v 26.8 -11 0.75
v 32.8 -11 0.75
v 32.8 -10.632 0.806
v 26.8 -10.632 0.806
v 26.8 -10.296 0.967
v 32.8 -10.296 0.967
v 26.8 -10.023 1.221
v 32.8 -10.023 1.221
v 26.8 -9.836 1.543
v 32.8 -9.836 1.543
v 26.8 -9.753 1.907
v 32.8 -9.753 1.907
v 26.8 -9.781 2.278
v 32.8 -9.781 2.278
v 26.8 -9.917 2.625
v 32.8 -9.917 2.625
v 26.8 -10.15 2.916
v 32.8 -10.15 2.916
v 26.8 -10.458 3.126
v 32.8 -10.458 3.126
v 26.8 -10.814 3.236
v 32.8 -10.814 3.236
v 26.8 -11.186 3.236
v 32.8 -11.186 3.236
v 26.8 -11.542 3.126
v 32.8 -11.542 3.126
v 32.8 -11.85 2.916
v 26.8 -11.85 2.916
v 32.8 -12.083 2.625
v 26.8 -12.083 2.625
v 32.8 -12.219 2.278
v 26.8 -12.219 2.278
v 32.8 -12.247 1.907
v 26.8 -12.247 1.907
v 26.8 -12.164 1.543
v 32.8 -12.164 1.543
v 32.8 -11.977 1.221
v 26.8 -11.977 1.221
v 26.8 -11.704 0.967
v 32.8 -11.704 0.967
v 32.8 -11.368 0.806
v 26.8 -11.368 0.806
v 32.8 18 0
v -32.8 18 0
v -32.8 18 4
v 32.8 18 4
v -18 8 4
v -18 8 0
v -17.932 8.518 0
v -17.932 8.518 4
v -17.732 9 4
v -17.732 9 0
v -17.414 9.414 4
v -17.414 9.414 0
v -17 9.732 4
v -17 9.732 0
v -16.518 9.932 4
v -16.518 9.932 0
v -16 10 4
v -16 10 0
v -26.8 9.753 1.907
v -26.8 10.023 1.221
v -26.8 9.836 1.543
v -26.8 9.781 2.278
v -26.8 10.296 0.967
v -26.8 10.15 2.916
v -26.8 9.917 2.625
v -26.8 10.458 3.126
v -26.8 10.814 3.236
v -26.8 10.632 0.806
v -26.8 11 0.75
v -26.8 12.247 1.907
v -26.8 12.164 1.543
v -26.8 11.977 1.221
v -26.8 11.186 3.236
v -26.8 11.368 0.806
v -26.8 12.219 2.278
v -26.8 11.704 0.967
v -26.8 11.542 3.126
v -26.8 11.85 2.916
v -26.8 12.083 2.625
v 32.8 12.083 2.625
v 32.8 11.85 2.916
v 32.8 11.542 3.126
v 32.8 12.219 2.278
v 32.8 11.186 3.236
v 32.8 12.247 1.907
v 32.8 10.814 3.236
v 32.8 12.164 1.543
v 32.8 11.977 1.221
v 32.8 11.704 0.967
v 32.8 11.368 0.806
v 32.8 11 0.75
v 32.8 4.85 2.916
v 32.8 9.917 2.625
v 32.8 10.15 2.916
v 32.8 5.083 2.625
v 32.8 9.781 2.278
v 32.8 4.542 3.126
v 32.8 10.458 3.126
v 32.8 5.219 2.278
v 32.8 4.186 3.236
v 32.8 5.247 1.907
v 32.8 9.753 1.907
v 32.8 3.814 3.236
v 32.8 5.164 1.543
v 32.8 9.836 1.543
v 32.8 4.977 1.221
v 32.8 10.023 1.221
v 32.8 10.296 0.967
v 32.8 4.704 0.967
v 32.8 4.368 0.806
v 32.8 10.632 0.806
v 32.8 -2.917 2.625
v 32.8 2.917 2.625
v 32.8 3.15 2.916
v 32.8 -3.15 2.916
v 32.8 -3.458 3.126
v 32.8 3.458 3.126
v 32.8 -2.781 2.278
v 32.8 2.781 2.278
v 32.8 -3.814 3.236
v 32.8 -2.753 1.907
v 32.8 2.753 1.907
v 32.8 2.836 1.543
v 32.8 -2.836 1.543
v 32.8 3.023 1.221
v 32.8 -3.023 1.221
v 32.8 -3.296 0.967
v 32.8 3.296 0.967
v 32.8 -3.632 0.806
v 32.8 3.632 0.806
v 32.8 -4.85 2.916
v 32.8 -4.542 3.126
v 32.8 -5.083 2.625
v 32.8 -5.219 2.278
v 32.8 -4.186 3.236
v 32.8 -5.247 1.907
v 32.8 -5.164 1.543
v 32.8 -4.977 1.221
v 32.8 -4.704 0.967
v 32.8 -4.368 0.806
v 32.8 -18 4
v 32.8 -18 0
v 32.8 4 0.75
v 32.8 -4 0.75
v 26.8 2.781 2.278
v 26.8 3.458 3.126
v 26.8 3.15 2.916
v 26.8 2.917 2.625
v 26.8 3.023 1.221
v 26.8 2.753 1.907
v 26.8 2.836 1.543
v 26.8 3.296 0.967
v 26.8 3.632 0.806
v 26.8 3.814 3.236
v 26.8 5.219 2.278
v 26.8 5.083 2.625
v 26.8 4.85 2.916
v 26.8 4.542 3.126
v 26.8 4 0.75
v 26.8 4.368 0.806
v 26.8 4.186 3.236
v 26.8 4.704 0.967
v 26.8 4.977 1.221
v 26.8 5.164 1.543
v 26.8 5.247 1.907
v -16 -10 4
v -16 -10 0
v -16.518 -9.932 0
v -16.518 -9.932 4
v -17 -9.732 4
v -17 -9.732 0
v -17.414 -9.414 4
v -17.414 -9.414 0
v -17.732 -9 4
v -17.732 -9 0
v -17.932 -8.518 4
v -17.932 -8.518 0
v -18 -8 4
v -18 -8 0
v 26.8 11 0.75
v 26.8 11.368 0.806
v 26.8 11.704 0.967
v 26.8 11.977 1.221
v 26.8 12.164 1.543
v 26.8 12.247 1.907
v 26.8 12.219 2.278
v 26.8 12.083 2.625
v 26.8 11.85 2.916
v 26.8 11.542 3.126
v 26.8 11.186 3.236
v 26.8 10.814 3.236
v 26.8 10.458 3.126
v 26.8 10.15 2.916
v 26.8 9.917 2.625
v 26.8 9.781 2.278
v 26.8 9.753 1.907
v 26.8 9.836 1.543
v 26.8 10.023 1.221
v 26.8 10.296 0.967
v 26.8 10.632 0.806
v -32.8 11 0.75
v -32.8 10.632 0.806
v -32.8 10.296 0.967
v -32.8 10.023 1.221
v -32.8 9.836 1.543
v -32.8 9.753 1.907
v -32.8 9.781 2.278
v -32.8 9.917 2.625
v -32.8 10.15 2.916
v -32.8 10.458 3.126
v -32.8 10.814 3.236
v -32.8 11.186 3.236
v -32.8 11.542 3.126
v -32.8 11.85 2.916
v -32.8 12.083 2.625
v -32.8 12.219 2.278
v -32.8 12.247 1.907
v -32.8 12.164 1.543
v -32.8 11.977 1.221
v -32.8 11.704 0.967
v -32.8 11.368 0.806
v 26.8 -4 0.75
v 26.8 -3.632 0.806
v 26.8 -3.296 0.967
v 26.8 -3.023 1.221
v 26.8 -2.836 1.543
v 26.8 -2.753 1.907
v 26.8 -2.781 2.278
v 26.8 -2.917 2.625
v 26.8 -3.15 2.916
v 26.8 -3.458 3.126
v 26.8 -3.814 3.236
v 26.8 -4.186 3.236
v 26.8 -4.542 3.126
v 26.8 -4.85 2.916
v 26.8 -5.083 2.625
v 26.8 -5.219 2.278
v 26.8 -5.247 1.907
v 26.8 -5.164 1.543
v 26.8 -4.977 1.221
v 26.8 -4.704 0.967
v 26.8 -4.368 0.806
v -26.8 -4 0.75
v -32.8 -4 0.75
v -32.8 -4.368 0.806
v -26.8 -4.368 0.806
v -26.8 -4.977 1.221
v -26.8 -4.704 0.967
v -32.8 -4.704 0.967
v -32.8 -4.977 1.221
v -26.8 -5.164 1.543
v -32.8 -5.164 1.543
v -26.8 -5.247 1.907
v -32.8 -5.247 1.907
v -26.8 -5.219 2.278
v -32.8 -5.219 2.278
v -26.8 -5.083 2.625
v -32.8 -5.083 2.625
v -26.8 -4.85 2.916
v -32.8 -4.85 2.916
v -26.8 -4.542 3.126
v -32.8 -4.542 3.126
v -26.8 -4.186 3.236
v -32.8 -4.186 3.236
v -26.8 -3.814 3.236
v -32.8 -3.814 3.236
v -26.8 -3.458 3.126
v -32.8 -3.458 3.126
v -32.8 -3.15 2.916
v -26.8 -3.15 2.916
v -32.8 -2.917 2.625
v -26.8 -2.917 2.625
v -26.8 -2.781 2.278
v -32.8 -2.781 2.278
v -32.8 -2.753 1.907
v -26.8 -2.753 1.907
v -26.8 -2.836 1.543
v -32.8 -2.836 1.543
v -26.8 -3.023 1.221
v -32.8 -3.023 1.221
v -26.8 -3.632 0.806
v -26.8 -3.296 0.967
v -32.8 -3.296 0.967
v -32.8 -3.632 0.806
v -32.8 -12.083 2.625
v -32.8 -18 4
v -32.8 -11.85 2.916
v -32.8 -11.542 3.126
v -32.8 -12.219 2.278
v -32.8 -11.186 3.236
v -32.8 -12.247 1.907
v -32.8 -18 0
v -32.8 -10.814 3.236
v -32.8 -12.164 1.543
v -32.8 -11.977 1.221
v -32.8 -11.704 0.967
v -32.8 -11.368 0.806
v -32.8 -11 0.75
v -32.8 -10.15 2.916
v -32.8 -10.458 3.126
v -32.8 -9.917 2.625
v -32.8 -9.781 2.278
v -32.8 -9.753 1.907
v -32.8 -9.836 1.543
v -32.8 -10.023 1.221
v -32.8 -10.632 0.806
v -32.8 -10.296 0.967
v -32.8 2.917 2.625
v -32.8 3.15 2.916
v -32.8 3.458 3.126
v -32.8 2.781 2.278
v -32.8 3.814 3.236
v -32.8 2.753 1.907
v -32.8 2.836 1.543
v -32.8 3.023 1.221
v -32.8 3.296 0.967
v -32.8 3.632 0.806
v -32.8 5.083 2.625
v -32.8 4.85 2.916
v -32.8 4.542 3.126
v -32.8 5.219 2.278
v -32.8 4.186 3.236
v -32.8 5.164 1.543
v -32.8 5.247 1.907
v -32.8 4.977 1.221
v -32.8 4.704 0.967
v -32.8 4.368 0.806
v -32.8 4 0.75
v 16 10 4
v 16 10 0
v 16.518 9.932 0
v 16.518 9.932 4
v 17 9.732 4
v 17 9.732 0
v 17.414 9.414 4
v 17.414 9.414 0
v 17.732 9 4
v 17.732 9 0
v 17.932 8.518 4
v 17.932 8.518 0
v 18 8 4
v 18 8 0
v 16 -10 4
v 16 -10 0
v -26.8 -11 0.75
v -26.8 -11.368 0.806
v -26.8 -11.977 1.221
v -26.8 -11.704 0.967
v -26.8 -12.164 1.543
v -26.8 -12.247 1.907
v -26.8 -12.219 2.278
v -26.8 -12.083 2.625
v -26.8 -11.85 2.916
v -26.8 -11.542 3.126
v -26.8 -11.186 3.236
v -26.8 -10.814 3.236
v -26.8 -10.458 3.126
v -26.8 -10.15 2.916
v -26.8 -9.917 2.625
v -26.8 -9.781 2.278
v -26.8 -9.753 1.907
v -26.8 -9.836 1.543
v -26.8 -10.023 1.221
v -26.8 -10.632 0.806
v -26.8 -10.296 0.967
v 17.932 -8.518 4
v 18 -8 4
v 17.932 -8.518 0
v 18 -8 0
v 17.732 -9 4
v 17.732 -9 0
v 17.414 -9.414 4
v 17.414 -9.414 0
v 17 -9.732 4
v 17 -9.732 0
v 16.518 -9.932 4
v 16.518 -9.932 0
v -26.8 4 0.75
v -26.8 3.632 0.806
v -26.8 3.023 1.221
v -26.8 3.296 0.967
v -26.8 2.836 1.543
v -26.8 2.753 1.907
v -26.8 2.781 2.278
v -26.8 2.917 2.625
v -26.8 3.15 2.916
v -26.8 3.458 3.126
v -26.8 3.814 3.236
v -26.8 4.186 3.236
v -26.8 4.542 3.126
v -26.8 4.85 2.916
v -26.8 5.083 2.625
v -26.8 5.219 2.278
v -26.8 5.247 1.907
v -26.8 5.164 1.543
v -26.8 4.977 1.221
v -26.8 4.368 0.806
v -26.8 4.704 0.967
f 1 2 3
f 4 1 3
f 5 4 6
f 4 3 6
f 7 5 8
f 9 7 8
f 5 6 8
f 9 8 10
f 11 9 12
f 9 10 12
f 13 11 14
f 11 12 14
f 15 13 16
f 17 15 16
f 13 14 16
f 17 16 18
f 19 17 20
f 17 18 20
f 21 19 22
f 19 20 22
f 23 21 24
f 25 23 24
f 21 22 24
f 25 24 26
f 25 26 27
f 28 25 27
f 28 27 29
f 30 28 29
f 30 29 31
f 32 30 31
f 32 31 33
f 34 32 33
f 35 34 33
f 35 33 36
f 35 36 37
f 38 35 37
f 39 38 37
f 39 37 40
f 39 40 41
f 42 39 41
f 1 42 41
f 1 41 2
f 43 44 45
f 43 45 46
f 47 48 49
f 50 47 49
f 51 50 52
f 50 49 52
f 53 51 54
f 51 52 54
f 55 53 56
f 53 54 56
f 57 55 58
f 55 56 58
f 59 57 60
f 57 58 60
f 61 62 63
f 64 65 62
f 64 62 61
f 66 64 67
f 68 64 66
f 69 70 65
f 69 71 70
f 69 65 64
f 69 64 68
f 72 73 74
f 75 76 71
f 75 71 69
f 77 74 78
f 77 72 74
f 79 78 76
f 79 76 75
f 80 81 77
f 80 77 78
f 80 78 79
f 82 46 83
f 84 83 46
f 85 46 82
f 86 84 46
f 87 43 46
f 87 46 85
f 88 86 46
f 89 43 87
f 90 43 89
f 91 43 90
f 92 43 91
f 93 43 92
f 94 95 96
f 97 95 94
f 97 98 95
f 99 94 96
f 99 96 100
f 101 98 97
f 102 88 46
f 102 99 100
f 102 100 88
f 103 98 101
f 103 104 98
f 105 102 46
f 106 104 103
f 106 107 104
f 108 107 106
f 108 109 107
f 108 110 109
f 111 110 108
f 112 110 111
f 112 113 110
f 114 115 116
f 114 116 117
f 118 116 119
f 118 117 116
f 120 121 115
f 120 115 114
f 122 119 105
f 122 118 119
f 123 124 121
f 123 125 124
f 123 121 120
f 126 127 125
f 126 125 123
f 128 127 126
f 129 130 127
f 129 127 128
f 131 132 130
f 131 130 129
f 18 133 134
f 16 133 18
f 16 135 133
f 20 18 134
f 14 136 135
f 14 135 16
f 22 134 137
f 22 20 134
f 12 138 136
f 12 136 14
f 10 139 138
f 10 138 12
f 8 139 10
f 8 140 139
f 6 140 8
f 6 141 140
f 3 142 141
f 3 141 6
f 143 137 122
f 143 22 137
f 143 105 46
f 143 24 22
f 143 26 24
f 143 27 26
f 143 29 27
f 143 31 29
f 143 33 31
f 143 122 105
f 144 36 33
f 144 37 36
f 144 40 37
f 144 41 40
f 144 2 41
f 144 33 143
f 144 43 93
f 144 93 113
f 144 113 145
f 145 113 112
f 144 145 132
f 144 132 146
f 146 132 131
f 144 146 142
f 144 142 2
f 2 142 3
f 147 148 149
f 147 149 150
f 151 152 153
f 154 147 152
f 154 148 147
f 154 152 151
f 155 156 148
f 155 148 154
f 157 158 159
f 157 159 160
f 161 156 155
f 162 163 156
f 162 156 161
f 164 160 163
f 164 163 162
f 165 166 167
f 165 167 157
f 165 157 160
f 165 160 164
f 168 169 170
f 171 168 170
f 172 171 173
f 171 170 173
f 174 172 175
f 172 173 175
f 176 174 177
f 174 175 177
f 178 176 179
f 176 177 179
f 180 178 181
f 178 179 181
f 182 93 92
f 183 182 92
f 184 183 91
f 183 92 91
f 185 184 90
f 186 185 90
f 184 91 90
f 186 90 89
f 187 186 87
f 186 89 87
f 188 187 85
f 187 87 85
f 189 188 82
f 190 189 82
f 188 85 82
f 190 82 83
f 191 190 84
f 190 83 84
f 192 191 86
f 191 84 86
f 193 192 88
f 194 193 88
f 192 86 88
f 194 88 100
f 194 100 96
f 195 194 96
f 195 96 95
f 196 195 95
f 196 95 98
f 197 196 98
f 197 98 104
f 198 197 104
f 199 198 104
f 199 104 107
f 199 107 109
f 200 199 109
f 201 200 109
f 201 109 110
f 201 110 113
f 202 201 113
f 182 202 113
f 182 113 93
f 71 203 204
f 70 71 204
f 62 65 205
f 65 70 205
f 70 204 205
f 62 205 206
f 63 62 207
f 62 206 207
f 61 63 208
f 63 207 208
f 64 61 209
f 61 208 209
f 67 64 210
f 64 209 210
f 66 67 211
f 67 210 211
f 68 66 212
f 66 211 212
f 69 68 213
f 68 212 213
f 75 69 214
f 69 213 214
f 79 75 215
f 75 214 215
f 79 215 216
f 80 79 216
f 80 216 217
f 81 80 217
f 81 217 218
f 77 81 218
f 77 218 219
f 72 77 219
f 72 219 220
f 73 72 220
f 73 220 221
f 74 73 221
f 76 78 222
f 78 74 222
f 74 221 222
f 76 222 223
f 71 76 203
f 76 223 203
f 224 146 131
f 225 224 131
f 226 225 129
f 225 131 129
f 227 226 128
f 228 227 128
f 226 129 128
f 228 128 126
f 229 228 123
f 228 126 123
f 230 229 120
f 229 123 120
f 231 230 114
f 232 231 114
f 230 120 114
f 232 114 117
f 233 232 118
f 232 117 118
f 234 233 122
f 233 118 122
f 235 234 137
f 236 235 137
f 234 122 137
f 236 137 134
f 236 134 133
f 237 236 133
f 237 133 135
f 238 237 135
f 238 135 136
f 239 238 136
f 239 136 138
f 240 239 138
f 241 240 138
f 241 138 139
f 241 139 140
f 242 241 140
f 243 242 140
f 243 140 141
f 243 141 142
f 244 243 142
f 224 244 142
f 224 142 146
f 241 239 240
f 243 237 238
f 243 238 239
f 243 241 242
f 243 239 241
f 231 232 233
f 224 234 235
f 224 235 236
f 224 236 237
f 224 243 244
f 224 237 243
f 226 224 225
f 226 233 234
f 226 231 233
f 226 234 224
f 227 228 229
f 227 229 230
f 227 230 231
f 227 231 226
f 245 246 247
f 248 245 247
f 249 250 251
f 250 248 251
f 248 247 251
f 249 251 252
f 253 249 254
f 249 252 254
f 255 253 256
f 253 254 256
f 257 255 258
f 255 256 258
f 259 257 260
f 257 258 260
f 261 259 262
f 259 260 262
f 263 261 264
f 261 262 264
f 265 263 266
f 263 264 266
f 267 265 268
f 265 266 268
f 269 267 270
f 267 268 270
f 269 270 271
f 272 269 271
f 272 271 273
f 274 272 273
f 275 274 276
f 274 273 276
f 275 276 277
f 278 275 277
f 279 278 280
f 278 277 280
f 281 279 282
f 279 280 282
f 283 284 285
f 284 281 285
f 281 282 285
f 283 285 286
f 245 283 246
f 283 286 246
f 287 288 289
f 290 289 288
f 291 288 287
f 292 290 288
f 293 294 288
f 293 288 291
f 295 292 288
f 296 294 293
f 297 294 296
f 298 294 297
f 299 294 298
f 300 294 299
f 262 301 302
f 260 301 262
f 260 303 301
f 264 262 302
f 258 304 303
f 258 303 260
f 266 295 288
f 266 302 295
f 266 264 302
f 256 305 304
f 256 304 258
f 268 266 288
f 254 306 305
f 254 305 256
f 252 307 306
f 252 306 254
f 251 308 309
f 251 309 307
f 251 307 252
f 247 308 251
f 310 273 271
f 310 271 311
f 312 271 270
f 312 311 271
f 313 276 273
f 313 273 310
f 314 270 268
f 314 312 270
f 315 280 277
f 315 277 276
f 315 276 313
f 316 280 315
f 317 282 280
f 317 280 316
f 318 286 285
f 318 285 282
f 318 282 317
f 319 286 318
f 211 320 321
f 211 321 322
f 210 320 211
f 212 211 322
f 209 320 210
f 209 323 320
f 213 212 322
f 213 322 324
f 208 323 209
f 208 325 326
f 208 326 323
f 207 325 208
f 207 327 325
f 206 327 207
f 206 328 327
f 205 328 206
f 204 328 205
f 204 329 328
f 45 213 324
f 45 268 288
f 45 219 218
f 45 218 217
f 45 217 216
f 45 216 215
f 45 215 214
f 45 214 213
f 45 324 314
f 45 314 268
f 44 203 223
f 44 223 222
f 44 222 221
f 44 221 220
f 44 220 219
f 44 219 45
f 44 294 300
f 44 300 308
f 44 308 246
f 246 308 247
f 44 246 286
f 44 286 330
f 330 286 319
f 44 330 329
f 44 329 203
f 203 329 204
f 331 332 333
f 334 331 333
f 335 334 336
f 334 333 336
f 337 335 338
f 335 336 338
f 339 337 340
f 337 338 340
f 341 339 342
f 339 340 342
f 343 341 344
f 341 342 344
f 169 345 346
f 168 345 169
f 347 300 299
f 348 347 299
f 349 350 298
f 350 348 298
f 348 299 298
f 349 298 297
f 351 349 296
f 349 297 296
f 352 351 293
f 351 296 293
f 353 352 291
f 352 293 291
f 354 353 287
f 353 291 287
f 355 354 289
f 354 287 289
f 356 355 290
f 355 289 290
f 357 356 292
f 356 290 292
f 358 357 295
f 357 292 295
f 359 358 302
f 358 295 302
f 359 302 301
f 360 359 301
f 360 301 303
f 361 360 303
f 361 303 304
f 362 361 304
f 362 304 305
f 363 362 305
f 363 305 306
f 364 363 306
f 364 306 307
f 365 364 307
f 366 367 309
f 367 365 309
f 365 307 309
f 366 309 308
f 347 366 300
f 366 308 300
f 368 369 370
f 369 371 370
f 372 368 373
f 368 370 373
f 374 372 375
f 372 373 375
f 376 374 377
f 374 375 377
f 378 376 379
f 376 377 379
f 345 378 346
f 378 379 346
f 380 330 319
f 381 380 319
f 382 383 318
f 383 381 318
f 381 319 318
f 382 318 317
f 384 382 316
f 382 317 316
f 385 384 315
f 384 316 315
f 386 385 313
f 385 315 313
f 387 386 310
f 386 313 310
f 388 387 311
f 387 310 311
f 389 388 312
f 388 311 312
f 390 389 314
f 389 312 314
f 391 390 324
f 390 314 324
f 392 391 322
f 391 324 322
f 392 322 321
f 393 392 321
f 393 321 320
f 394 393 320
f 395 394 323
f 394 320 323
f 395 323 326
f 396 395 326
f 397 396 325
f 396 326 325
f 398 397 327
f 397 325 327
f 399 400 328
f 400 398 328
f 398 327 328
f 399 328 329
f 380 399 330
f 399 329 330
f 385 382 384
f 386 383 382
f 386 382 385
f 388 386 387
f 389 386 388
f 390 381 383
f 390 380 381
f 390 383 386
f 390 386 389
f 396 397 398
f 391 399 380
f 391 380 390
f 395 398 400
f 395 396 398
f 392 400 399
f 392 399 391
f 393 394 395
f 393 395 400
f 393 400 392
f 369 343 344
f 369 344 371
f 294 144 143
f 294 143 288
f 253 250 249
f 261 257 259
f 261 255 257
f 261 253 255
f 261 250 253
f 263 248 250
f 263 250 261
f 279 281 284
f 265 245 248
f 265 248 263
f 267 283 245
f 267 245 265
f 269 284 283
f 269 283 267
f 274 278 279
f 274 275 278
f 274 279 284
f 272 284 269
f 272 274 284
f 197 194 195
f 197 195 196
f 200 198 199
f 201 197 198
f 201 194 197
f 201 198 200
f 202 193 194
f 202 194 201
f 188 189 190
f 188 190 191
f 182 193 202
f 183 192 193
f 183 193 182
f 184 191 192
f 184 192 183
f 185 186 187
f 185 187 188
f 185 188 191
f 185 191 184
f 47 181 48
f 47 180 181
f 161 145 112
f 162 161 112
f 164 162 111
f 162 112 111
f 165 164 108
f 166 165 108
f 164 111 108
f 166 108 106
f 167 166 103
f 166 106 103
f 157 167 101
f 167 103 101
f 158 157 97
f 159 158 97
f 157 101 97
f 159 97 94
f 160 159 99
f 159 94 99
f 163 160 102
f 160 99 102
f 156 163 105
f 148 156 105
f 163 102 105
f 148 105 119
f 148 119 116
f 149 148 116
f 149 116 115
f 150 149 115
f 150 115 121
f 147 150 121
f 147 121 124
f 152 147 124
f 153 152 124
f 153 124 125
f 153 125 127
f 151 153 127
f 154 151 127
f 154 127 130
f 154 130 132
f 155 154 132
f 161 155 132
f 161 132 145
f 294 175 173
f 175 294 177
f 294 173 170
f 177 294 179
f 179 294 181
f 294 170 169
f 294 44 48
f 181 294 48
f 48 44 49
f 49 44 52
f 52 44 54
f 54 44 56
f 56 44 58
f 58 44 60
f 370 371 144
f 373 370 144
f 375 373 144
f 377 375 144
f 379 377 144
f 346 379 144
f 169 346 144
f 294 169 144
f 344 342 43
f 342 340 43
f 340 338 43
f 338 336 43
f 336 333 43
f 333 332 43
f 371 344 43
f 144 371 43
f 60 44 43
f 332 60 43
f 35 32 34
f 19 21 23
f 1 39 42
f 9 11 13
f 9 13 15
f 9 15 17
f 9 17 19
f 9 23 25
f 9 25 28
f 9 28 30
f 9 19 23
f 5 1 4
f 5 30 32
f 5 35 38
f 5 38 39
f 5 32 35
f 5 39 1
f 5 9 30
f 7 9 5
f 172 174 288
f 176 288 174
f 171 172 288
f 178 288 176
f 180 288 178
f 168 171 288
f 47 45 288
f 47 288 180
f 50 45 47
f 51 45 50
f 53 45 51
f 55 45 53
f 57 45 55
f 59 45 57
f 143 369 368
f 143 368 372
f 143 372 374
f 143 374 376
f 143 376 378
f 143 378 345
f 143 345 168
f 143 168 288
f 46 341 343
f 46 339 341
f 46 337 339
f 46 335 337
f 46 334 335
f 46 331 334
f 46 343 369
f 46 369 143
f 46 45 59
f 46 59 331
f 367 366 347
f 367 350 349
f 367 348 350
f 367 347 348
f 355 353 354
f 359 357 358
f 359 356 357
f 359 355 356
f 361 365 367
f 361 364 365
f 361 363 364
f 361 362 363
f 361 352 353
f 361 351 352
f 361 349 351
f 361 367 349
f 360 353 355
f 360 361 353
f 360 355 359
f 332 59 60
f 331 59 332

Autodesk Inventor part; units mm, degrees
ref_plane "YZ Plane" through (0, 0, 0) normal (1, 0, 0) x (0, 1, 0)
ref_plane "XZ Plane" through (0, 0, 0) normal (0, 1, 0) x (-1, 0, 0)
ref_plane "XY Plane" through (0, 0, 0) normal (0, 0, 1) x (1, 0, 0)
sketch "스케치1" plane through (0, 0, 0) normal (0, 0, 1) x (1, 0, 0)
  line L0 (-32.8, 18) -> (32.8, 18)
  line L1 (32.8, 18) -> (32.8, -18)
  line L2 (32.8, -18) -> (-32.8, -18)
  line L3 (-32.8, -18) -> (-32.8, 18)
  line L4 (-32.8, 18) -> (32.8, -18) construction
  line L5 (32.8, 18) -> (-32.8, -18) construction
  point P0 (0, 0)
  dimension "d0" = 65.6
  dimension "d1" = 36
extrude "돌출1" add sketch "스케치1" along normal blind 4
sketch "스케치2" plane through (32.8, -18, 0) normal (1, 0, 0) x (0, 0, -1)
  line L0 (0, 0) -> (0, 36) projected
  line L1 (0, 36) -> (-4, 36) projected
  line L2 (-4, 0) -> (-4, 36) projected
  line L3 (0, 0) -> (-4, 0) projected
  line L4 (0, 0) -> (-4, 0) projected
  line L5 (-2, 0) -> (-2, 36) construction
  line L6 (0, 36) -> (-4, 36) projected
  circle A0 centre (-2, 7) radius 1.25
  circle A1 centre (-2, 14) radius 1.25
  circle A2 centre (-2, 22) radius 1.25
  circle A3 centre (-2, 29) radius 1.25
  point P0 (0, 18)
  dimension "d4" = 2.5
  dimension "d5" = 2.5
  dimension "d7" = 2.5
  dimension "d8" = 7
  dimension "d9" = 7
  dimension "d11" = 2.5
  dimension "d12" = 7
  dimension "d13" = 7
extrude "돌출2" cut sketch "스케치2" against normal blind 6 contours A0 | A1 | A2 | A3
mirror "미러1" about plane through (0, 0, 0) normal (1, 0, 0) of "돌출2"
sketch "스케치3" plane through (0, 0, 4) normal (0, 0, 1) x (1, 0, 0)
  line L0 (18, -10) -> (-18, -10)
  line L1 (-18, -10) -> (-18, 10)
  line L2 (-18, 10) -> (18, 10)
  line L3 (18, 10) -> (18, -10)
  line L4 (18, -10) -> (-18, 10) construction
  line L5 (-18, -10) -> (18, 10) construction
  point P0 (0, 0)
  dimension "d16" = 36
  dimension "d17" = 20
extrude "돌출3" cut sketch "스케치3" against normal blind 6
fillet "모깎기1" radius 2 4 edges at (18, -10, 2) (18, 10, 2) (-18, 10, 2) (-18, -10, 2)
properties part number "지지프레임1" material "알루미늄 6061"
